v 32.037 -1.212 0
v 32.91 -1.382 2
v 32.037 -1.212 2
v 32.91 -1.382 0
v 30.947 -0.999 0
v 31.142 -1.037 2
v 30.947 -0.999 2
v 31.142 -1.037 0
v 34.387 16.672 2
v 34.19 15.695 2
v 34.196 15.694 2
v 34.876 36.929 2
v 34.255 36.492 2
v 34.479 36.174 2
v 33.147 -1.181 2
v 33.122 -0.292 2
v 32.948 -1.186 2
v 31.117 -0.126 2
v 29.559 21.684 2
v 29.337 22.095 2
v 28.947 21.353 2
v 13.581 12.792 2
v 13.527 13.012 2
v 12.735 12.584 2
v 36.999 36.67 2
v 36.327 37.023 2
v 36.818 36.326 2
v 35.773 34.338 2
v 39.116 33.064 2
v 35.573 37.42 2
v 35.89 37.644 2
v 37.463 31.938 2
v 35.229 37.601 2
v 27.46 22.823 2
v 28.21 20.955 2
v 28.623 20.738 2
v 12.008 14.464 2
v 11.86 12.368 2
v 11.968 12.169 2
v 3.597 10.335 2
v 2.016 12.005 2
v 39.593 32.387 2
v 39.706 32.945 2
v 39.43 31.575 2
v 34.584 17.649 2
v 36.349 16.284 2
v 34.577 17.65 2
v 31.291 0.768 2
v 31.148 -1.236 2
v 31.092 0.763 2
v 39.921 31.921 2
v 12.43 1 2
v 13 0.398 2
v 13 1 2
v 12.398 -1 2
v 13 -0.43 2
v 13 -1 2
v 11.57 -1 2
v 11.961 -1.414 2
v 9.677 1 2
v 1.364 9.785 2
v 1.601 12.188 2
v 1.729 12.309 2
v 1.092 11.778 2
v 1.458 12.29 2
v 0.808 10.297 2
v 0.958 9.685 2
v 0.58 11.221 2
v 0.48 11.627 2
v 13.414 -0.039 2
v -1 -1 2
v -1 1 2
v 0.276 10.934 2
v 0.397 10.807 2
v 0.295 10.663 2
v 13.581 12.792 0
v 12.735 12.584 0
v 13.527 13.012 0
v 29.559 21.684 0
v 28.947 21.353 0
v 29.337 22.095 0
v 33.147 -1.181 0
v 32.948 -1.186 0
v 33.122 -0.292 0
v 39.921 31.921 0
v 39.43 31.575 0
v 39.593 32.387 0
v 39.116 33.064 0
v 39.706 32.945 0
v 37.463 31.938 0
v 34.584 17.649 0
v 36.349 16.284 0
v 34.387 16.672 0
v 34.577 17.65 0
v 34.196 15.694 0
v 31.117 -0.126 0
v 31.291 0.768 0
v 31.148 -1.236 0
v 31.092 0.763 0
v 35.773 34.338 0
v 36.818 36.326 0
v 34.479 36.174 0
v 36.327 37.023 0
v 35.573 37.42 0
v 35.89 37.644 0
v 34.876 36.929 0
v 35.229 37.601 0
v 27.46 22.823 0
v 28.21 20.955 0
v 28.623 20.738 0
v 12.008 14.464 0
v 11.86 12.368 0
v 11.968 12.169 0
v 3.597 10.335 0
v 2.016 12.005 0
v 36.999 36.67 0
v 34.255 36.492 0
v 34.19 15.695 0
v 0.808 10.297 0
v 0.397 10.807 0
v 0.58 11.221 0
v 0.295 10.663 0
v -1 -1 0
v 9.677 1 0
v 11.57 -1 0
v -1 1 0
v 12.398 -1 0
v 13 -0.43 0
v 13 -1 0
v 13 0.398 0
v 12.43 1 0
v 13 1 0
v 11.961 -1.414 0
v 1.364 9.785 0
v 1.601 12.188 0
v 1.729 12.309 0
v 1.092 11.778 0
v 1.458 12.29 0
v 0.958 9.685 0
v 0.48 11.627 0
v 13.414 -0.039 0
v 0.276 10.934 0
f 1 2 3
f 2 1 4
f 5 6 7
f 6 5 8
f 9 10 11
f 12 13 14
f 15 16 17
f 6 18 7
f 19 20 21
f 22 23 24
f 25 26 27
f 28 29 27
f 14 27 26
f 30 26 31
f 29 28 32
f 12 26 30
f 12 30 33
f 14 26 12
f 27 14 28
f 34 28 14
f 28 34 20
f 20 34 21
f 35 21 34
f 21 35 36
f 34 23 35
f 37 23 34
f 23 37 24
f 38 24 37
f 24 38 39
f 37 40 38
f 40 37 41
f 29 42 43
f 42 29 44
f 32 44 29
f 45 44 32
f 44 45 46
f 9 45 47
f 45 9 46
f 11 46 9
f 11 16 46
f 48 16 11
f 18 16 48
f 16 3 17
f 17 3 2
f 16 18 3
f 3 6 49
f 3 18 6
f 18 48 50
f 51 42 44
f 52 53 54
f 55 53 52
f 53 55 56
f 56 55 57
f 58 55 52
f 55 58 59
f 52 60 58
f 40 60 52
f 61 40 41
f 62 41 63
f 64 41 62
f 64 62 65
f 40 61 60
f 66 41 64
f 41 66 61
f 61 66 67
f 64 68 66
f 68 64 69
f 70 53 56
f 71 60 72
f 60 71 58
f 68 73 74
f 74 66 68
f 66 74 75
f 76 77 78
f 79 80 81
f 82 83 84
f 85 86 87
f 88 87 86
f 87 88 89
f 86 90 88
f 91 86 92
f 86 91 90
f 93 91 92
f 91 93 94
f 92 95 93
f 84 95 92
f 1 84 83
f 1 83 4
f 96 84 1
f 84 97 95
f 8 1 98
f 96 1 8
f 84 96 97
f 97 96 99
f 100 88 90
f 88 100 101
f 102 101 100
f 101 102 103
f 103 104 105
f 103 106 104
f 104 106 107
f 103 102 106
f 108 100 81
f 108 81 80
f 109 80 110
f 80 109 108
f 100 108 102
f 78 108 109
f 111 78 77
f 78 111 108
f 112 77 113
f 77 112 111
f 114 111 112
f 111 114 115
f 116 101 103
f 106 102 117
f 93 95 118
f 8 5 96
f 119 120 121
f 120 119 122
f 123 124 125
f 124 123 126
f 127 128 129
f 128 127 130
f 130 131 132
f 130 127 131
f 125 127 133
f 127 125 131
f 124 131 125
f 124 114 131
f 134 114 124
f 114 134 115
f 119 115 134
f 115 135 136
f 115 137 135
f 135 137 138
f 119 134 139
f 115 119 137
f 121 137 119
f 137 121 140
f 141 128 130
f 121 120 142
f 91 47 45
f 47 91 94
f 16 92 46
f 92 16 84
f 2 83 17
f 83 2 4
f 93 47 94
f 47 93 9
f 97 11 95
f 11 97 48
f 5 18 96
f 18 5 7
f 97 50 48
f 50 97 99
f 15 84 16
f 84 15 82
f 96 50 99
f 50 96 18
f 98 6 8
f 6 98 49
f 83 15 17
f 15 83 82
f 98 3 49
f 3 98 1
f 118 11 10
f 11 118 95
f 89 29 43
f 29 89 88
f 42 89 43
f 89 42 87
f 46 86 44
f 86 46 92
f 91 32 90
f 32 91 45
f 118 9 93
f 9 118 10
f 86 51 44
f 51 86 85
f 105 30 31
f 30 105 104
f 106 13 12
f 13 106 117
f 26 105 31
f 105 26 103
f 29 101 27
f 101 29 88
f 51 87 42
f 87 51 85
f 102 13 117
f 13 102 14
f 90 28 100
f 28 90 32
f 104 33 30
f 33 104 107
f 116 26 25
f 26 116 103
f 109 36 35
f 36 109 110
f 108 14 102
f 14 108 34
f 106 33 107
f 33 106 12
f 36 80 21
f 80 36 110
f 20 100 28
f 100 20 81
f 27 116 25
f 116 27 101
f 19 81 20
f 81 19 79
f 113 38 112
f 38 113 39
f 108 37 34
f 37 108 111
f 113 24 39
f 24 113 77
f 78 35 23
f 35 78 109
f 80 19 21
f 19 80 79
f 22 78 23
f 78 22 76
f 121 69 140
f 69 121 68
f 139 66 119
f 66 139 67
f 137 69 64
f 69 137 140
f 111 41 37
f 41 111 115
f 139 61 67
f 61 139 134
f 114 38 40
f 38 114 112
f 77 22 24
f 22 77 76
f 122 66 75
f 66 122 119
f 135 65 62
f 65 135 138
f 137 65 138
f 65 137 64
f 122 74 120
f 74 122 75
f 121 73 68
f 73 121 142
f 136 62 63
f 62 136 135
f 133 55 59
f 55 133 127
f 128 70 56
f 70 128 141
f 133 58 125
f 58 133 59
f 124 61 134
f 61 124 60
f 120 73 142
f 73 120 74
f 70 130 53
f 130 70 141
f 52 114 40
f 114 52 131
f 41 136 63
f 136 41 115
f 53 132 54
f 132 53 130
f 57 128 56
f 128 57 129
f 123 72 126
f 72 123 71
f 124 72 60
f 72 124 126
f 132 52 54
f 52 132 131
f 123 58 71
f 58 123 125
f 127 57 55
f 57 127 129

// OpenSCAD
function gen_length(max_length, height) = round(rands(height,max_length,1)[0]);

function gen_angle() = rands(-160, 160, 1)[0];

function matrix_identity() = 
    [ [1, 0, 0, 0],
      [0, 1, 0, 0],
      [0, 0, 1, 0],
      [0, 0, 0, 1] ];

function matrix_translate1(length, height, must_jump) =
    [ [1, 0, 0, length-height],
      [0, 1, 0, 0],
      [0, 0, 1, must_jump ? height:0],
      [0, 0, 0,  1] ];

function matrix_translate2(height) =
    [ [1, 0, 0, -height/2],
      [0, 1, 0, -height/2],
      [0, 0, 1, 0], //to make translate when intersecting
      [0, 0, 0,  1] ];

function matrix_rotate(angle) =       
    [ [cos(angle), -sin(angle), 0, 0],
      [sin(angle),  cos(angle), 0, 0],
      [         0,           0, 1, 0],
      [         0,           0, 0,  1] ];

function bar_vertices(length, height, mtx) = cube_vertices(-height/2, length-height/2, height/2, height, mtx);

function cube_vertices(dx1,dx2, dy, dz, mtx) = 
    [
        mtx*[  dx1,  -dy,  0, 1 ],  //0
        mtx*[ dx2,  -dy,  0, 1 ],  //1
        mtx*[ dx2,  dy,  0, 1 ],  //2
        mtx*[  dx1,  dy,  0, 1 ],  //3
        mtx*[  dx1,  -dy,  dz, 1 ],  //4
        mtx*[ dx2,  -dy,  dz, 1 ],  //5
        mtx*[ dx2,  dy,  dz, 1 ],  //6
        mtx*[  dx1,  dy,  dz, 1 ]]; //7

CubeFaces = [
  [0,1,2,3],  // bottom
  [4,5,1,0],  // front
  [7,6,5,4],  // top
  [5,6,2,1],  // right
  [6,7,3,2],  // back
  [7,4,0,3]]; // left
  
counter = [];  

function plane_side(p0, p1, p2, q) = (q-p1)*cross((p0-p1)*(p2-p1)) > 0;

function inside(p0, p1, p2, r0, r1, r2, q) = plane_side(p0, p1, p2, q) == !plane_side(r0, r1, r2, q);

function inside_face(bar_vtx, inx, q) = inside(bar_vtx[inx[0]], bar_vtx[inx[1]], bar_vtx[inx[2]], bar_vtx[inx[3]], bar_vtx[inx[4]], bar_vtx[inx[5]], q);
    
function inside_bar(bar_vtx, q) = inside_face(bar_vtx, [0,1,2,7,6,5],q) && inside(bar_vtx, [4,5,1,6,7,3],q) && inside(bar_vtx,[5,6,2,7,4,0],q);

function intersect_bars(bar_vtx1, bar_vtx2) = len([for (i = [0:7]) if (inside_bar(bar_vtx1, bar_vtx2[i])) 1]); 

module step1(max_length=10, height=1, mtx, n=5, counter)
    {
        length = gen_length(max_length, height);
        angle = gen_angle();
        mtxr = [ for (i = [ 0 : 2 ]) [ for (j = [ 0 : 3 ]) mtx[i][j] ] ];
        bar_vtx = bar_vertices(length,height,mtxr);
        intersect_array = [for (i = [0, len(counter)-2]) if (intersect_bars(counter[i], bar_vtx)) 1];
        must_jump = (len(intersect_array) > 0);
        echo("ARRAY:", intersect_array, "Jump?:", must_jump);
        mt1 = matrix_translate1(length, height, must_jump);
        mt2 = matrix_translate2(height);
        mr = matrix_rotate(angle);
        mm = mt1*mr; //possibly the opposite
        mtx = mtx*mm;
        counter = concat(counter, [bar_vtx]);
        translate([-height/2, -height/2, 0])
            color("blue", 0.5)
                cube([length, height, height]);
                translate([length-height,0,must_jump ? height:0])
                    rotate([0,0,angle])
                        if (n>1) step1(max_length, height, mtx, n-1, counter);
    };




step1(20,2,matrix_identity(), 10, counter);    
    
